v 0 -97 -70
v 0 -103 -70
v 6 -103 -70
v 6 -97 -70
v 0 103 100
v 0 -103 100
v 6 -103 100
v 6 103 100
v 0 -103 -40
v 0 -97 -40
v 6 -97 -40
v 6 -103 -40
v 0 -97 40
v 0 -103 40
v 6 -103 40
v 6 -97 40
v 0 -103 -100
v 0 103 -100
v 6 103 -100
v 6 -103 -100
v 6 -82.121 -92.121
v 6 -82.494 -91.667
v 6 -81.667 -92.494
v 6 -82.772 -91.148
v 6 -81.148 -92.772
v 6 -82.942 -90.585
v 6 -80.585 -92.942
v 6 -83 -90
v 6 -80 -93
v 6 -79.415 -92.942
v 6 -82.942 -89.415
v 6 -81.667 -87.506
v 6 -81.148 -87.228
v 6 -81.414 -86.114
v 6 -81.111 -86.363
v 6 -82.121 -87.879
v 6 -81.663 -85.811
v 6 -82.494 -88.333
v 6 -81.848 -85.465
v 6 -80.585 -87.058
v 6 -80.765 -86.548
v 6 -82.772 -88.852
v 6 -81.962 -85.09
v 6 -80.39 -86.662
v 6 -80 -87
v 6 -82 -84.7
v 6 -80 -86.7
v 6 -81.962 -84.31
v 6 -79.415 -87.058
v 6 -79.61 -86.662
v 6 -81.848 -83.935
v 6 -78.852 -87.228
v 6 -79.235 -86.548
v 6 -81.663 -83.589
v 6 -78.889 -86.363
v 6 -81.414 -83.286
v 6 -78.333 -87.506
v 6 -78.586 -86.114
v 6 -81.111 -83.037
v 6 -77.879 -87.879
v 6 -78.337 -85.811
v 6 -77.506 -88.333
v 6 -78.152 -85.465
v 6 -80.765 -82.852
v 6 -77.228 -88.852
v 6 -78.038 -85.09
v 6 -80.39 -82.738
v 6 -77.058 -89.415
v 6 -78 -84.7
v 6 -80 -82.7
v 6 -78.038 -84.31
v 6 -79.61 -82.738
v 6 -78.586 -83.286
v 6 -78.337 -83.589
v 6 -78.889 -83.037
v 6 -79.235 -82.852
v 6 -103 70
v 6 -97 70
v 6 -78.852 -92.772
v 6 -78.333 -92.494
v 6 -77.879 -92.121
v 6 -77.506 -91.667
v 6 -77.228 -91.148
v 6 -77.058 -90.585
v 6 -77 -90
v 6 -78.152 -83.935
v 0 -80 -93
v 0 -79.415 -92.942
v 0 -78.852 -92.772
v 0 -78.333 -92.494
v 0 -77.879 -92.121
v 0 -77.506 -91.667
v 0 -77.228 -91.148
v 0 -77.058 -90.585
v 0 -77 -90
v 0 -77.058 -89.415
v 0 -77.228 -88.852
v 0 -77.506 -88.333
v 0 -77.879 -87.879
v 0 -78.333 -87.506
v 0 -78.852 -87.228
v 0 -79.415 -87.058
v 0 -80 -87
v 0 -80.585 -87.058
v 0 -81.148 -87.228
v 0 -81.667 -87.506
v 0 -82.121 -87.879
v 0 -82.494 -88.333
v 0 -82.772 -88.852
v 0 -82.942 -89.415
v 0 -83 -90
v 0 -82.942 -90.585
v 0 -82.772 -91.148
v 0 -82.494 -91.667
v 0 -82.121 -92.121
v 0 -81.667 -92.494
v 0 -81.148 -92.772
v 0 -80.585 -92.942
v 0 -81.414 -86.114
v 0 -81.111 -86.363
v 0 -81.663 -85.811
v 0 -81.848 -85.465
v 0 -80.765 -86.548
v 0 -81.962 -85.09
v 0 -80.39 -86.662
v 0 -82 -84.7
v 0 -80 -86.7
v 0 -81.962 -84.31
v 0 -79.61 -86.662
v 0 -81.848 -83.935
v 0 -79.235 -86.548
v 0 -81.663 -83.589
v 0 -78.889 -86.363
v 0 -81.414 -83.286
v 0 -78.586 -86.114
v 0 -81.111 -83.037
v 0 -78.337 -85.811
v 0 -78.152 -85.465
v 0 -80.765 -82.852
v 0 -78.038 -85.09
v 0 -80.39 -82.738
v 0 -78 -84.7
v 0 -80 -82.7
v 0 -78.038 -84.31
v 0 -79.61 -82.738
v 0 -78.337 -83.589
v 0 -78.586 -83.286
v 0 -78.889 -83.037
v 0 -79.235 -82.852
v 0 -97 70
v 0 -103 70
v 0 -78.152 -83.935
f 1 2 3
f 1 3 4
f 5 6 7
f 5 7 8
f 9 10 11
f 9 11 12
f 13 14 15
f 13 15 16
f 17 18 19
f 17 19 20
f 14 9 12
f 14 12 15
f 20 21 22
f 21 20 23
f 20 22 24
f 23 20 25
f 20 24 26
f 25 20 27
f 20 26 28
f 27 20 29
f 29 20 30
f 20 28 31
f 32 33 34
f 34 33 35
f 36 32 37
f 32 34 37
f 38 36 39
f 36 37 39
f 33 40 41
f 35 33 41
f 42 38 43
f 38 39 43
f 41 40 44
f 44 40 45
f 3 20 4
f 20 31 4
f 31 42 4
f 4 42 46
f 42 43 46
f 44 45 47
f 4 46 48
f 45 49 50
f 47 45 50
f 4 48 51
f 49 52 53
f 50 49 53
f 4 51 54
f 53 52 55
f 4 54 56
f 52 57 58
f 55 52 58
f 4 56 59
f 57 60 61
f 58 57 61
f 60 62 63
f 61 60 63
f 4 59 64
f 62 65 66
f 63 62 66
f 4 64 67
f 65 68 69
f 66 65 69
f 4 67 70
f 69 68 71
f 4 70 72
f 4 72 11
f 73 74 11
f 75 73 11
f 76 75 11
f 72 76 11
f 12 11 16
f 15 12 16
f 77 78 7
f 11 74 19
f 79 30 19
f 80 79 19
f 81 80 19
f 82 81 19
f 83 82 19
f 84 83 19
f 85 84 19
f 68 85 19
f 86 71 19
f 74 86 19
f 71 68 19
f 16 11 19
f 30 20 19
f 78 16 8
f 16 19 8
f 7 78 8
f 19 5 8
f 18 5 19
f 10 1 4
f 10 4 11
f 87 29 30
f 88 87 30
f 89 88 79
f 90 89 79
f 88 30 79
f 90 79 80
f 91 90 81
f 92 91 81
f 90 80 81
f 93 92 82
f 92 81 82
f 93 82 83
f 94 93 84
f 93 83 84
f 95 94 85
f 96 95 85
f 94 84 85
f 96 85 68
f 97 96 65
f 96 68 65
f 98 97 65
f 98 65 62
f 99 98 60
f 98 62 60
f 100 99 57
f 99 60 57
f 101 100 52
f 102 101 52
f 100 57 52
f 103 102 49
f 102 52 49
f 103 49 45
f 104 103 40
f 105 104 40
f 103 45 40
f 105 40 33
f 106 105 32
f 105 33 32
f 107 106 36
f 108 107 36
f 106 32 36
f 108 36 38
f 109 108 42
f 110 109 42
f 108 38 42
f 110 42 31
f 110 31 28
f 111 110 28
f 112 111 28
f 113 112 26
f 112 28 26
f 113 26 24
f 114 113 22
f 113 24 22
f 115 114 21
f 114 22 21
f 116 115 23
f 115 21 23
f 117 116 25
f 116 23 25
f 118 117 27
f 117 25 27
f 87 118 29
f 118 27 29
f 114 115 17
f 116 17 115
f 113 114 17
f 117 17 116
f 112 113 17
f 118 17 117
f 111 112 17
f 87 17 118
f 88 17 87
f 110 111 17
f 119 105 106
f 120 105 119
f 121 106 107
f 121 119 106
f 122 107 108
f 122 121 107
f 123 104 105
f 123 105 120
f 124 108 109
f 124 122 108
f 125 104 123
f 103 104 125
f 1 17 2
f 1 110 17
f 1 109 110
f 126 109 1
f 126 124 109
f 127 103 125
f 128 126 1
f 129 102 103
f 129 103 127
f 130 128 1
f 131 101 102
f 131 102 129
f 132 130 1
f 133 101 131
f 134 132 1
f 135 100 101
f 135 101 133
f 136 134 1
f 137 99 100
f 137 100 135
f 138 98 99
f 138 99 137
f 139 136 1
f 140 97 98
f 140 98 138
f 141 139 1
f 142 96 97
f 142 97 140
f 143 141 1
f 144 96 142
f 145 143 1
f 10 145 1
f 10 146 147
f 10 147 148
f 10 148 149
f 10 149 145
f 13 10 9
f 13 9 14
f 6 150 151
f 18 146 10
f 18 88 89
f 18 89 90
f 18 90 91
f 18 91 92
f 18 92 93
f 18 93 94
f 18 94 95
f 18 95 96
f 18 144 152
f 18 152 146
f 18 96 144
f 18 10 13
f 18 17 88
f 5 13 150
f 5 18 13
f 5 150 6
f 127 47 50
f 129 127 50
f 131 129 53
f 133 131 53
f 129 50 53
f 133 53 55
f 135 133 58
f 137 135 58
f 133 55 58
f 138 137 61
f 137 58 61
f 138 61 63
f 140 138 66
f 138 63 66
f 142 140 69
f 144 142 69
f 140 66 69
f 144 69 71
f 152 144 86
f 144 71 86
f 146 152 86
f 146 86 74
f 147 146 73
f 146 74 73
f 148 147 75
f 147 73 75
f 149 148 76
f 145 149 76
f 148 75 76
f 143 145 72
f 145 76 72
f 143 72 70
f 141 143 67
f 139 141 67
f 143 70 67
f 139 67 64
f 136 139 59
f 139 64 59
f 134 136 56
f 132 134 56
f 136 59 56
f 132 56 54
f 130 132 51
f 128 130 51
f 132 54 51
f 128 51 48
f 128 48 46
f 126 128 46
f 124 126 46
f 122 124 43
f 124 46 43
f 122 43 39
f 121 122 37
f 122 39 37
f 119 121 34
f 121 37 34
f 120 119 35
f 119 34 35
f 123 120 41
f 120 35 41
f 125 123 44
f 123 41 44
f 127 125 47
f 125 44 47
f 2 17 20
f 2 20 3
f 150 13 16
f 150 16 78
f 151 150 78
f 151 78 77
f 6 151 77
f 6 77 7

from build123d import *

# Parameters (mm, degrees)
RESSALTO_EXTRUS_O3_DEPTH = 6
ESBO_O3_R                = 3
ESBO_O3_R_2              = 2
CORTE_EXTRUS_O4_DEPTH    = 6


with BuildPart() as part:
    # Esboço1 → Ressalto-extrusão3 (new body)
    with BuildSketch(Plane(origin=(0, 0, 0), x_dir=(0, 0, -1), z_dir=(1, 0, 0))):
        Polygon((-70, -103), (-100, -103), (-100, 103), (100, 103), (100, -103), (70, -103), (70, -97), (40, -97), (40, -103), (-40, -103), (-40, -97), (-70, -97), align=None)
    extrude(amount=RESSALTO_EXTRUS_O3_DEPTH)

    # Esboço3 → Corte-extrusão4 (cut)
    with BuildSketch(Plane(origin=(6, 0, 0), x_dir=(0, 0, -1), z_dir=(1, 0, 0))):
        with Locations((90, -80)):
            Circle(ESBO_O3_R)
        with Locations((84.7, -80)):
            Circle(ESBO_O3_R_2)
    extrude(amount=-CORTE_EXTRUS_O4_DEPTH, mode=Mode.SUBTRACT)


solid = part.part
